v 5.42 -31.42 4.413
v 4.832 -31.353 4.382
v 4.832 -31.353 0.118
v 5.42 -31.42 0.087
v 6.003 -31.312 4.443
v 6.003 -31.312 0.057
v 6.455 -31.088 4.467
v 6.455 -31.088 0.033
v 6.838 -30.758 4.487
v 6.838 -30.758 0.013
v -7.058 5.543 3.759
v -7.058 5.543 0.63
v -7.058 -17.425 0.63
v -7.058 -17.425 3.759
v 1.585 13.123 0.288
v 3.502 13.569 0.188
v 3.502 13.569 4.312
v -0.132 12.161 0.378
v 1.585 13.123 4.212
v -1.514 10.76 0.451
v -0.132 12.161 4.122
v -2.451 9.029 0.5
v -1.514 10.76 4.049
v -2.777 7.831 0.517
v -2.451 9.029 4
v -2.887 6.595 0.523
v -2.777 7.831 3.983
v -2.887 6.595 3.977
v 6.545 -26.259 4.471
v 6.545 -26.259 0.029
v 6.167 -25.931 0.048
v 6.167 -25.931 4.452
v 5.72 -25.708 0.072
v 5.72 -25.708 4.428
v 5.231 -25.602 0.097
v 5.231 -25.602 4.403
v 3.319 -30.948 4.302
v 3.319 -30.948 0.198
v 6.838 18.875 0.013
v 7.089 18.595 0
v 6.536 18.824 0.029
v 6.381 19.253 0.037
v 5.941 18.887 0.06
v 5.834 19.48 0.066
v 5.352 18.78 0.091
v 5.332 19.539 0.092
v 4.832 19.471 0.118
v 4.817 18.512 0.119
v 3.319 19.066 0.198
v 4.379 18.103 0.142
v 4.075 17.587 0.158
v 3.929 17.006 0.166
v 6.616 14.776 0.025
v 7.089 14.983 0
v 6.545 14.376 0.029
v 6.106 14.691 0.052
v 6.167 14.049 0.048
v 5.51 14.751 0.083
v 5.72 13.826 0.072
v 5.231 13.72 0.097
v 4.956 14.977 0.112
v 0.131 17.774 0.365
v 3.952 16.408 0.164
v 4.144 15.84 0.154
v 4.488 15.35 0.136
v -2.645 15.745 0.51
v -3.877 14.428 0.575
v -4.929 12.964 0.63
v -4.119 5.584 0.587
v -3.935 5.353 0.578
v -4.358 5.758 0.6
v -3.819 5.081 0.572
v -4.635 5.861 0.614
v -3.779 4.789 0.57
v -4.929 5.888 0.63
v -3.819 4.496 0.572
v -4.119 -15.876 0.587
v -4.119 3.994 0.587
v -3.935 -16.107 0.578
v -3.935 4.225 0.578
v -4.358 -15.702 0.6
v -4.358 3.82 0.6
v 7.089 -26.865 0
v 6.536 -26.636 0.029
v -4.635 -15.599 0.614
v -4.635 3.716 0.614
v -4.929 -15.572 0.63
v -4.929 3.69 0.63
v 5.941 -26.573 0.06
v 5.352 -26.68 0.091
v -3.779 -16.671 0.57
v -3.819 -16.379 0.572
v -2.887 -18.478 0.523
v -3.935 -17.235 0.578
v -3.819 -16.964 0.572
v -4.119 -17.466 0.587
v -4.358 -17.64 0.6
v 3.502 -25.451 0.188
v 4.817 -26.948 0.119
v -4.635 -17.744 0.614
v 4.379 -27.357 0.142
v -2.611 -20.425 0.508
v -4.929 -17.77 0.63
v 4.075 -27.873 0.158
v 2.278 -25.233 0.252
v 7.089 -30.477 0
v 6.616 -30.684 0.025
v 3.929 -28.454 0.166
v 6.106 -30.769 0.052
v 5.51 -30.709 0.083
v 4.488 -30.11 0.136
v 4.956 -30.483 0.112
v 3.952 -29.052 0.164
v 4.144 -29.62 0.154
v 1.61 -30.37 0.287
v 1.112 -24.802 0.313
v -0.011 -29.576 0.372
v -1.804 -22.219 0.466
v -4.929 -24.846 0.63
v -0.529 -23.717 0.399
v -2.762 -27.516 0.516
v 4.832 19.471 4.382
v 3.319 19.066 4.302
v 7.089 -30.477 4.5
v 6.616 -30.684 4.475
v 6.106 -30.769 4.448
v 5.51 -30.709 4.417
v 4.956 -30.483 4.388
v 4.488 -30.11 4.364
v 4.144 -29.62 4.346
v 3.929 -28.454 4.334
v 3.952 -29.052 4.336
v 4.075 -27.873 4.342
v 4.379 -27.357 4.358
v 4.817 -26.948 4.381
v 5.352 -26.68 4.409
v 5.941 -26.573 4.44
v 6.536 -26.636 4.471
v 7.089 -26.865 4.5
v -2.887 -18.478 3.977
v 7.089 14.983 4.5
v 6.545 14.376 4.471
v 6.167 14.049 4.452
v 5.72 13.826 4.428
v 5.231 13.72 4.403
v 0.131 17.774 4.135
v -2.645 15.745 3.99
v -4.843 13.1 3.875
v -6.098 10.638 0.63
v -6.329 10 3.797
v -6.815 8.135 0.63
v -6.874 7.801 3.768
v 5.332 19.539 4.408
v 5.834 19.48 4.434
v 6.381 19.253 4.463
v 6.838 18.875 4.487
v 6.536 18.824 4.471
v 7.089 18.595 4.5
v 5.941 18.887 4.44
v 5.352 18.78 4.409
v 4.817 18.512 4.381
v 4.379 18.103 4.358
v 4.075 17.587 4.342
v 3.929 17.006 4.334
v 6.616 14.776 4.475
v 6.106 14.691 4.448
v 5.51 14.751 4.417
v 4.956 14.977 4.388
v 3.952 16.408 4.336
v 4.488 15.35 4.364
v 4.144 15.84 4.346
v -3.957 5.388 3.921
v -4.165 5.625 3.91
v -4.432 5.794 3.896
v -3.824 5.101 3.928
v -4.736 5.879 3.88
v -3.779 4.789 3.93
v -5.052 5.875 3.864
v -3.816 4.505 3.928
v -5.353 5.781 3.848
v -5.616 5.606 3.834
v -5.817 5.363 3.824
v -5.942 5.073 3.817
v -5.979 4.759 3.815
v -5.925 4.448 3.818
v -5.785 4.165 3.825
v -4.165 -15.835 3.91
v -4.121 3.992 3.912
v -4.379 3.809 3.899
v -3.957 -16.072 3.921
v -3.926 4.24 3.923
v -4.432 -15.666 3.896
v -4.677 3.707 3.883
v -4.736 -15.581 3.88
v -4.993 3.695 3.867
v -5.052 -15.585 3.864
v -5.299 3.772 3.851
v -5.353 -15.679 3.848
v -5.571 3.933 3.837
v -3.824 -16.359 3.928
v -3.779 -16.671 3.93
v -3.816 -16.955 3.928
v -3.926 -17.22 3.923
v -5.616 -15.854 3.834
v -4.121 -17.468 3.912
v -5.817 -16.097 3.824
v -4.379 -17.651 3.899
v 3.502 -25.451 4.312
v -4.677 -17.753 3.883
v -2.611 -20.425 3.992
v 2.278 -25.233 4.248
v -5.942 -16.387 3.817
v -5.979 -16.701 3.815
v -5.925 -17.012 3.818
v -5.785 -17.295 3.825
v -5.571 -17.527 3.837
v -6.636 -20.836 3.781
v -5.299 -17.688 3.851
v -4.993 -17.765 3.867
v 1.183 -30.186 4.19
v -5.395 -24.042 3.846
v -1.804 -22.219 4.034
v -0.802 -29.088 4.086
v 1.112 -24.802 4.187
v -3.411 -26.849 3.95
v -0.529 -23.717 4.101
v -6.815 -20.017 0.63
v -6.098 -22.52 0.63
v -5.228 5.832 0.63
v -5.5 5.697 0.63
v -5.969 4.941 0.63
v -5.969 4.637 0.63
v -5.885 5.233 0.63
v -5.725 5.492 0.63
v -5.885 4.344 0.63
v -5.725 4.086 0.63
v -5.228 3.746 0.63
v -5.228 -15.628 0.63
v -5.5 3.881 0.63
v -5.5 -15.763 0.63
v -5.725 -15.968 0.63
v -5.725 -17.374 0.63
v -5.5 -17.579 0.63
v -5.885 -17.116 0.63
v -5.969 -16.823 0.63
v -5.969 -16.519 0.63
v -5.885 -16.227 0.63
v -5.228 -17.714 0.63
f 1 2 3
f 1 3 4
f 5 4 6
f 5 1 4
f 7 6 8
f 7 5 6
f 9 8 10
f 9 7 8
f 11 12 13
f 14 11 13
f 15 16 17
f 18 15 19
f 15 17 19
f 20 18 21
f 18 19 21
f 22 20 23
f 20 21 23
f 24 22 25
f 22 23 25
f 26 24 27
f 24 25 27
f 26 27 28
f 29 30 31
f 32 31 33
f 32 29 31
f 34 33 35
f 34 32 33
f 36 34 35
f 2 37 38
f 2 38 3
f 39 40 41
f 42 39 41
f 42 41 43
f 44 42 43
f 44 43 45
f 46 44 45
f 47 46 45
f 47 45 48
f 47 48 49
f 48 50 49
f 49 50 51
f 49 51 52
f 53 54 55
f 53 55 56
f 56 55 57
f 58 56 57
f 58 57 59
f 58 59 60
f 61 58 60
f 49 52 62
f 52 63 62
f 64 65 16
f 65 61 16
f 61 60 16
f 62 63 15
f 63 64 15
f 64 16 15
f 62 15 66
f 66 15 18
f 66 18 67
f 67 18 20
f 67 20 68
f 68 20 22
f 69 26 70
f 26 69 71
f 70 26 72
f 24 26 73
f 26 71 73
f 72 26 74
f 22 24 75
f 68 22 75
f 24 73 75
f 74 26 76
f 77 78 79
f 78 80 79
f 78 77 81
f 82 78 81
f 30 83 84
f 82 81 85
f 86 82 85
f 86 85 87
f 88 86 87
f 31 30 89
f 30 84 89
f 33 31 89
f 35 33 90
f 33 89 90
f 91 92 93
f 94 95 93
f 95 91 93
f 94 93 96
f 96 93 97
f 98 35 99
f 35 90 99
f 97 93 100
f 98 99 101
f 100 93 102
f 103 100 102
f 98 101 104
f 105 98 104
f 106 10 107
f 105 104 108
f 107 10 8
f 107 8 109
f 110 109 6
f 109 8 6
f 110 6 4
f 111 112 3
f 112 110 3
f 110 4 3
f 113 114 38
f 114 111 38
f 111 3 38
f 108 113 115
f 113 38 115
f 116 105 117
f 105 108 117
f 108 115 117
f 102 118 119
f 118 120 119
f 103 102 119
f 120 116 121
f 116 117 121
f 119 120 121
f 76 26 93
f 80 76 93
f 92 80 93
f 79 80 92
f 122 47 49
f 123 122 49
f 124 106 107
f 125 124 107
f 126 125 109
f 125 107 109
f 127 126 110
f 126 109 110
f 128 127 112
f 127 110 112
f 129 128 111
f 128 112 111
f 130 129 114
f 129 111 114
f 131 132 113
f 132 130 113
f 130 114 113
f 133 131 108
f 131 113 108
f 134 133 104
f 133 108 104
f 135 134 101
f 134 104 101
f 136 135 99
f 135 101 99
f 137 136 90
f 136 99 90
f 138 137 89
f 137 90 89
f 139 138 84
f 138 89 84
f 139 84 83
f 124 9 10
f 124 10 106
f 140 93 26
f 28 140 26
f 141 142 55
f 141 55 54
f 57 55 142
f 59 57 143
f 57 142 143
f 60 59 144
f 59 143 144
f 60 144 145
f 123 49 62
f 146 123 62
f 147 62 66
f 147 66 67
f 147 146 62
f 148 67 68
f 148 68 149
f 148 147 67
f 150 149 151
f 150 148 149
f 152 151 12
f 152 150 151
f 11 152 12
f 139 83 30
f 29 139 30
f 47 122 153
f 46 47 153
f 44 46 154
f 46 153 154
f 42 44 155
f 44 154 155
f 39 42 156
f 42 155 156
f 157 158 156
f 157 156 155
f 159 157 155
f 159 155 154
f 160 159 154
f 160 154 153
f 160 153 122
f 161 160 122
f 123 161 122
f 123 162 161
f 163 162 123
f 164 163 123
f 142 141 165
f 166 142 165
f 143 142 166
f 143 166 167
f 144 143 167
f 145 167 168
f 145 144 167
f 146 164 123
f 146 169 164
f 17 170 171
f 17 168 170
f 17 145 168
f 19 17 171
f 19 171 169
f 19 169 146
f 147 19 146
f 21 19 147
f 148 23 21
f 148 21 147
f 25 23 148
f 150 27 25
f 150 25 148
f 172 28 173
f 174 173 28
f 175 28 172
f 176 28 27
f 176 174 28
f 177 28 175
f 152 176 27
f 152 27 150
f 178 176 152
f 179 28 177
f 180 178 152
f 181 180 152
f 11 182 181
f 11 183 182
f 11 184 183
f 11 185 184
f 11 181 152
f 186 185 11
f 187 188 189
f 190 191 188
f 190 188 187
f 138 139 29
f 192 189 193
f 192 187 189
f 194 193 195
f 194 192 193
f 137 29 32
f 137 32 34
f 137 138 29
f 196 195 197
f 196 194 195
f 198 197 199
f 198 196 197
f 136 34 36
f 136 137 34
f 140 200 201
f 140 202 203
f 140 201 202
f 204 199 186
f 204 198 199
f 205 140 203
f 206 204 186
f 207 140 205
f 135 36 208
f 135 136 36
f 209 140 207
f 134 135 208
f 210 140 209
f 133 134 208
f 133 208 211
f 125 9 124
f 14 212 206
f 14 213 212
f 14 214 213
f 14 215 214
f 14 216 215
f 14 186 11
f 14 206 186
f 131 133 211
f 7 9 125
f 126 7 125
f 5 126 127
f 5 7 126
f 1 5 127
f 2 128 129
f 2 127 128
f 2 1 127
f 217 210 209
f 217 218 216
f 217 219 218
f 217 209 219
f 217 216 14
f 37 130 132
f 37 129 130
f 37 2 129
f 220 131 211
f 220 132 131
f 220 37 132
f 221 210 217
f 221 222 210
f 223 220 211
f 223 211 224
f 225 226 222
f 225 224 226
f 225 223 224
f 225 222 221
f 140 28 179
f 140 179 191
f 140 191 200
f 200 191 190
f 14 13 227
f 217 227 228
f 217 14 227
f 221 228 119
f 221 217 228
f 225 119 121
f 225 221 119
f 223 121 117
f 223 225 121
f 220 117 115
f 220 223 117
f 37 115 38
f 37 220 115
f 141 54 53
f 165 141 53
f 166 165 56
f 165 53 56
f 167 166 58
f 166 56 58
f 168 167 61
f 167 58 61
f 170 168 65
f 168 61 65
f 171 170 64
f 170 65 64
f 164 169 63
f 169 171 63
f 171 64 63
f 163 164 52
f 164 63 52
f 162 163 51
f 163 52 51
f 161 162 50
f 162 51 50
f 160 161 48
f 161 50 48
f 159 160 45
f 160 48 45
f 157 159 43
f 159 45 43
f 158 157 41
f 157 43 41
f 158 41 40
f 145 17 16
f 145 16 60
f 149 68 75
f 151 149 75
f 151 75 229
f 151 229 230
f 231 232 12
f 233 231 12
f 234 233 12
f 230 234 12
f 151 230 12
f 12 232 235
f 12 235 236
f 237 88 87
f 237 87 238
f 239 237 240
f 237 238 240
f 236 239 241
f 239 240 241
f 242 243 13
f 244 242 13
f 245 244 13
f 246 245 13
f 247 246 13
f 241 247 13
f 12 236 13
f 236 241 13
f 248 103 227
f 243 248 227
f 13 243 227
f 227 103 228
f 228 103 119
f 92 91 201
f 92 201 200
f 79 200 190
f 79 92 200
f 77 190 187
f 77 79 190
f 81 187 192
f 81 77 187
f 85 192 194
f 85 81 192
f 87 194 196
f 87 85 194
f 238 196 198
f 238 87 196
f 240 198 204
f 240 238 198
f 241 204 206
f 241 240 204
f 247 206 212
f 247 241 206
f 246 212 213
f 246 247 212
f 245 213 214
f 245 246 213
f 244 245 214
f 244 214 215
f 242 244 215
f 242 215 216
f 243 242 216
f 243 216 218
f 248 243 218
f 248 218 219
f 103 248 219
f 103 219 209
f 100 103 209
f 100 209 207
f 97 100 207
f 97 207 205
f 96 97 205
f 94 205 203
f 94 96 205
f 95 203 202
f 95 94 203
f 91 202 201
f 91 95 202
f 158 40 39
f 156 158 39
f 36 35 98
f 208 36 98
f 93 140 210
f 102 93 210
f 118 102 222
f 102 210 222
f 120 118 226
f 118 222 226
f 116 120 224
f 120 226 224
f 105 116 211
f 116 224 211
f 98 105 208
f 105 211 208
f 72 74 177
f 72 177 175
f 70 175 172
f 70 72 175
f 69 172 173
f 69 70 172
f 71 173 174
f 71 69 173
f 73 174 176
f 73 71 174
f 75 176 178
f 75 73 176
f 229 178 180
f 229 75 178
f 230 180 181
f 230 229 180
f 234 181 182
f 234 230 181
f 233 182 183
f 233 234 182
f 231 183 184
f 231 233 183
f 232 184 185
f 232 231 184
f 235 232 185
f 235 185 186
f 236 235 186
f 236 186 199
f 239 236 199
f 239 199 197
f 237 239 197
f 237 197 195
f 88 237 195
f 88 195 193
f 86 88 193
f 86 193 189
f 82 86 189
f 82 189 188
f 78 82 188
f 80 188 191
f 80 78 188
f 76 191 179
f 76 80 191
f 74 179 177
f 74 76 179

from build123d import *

# Parameters (mm, degrees)
SKETCH_1_R               = 1.1
EXTRUDE_2_DEPTH          = 4.5
FILLET_1_R               = 7
FILLET_2_R               = 14
FILLET_3_R               = 2
CUT_EXTRUDE_1_DEPTH      = 33.524221985
CUT_EXTRUDE_1_DEPTH_BACK = 33.524221985


with BuildPart() as part:
    # 草图1 → 凸台-拉伸2 (new body)
    with BuildSketch(Plane.XY):
        with BuildLine():
            Line((6.017486991, 19.788810031), (-7.057549395, 16.285364591))
            Line((-7.057549395, 16.285364591), (-7.057549395, -16.139577348))
            Line((-7.057549395, -16.139577348), (-7.057549395, -28.167744528))
            Line((-7.057549395, -28.167744528), (6.017486991, -31.671189969))
            Line((6.017486991, -31.671189969), (7.089384541, -30.477023749))
            ThreePointArc((7.089384541, -30.477023749), (3.917486991, -28.671189969), (7.089384541, -26.865356188))
            Line((7.089384541, -26.865356188), (6.017486991, -25.671189969))
            Line((6.017486991, -25.671189969), (-2.887475269, -24.892106722))
            Line((-2.887475269, -24.892106722), (-2.887475269, 13.009726784))
            Line((-2.887475269, 13.009726784), (6.017486991, 13.788810031))
            Line((6.017486991, 13.788810031), (7.089384541, 14.982976251))
            ThreePointArc((7.089384541, 14.982976251), (3.917486991, 16.788810031), (7.089384541, 18.594643812))
            Line((7.089384541, 18.594643812), (6.017486991, 19.788810031))
        make_face()
        with Locations((-4.879152463, 4.788810031)):
            Circle(SKETCH_1_R, mode=Mode.SUBTRACT)
        with Locations((-4.879152463, -16.671189969)):
            Circle(SKETCH_1_R, mode=Mode.SUBTRACT)
    extrude(amount=EXTRUDE_2_DEPTH)

    # 圆角1
    fillet_1_edges = [part.edges().sort_by_distance(p)[0] for p in [
        (-2.887475269, 13.009726784, 2.25),
        (-2.887475269, -24.892106722, 2.25),
    ]]
    fillet(fillet_1_edges, radius=FILLET_1_R)

    # 圆角2
    fillet_2_edges = [part.edges().sort_by_distance(p)[0] for p in [
        (-7.057549395, -28.167744528, 2.25),
        (-7.057549395, 16.285364591, 2.25),
    ]]
    fillet(fillet_2_edges, radius=FILLET_2_R)

    # 圆角3
    fillet_3_edges = [part.edges().sort_by_distance(p)[0] for p in [
        (6.017486991, 13.788810031, 2.25),
        (6.017486991, -25.671189969, 2.25),
        (6.017486991, -31.671189969, 2.25),
        (6.017486991, 19.788810031, 2.25),
    ]]
    fillet(fillet_3_edges, radius=FILLET_3_R)

    # 草图2 → 切除-拉伸1 (cut, two sides: drawn at the far end of the back side and taken through both)
    with BuildSketch(Plane(origin=(0, 0, 0), x_dir=(1, 0, 0), z_dir=(0, 1, 0)).offset(-CUT_EXTRUDE_1_DEPTH_BACK)):
        Polygon((-9.937735325, -0.89235354), (-9.653427695, 2.8886559), (6.091848462, 2.8886559), (7.089384541, 0), (-4.928773799, -0.62984499), (-9.504604651, -0.62984499), align=None)
        Polygon((7.089384541, -4.5), (-9.927872999, -3.608163323), (-9.667318366, -5.613598375), (7.089384541, -5.407507841), align=None)
    extrude(amount=CUT_EXTRUDE_1_DEPTH + CUT_EXTRUDE_1_DEPTH_BACK, mode=Mode.SUBTRACT)


solid = part.part
